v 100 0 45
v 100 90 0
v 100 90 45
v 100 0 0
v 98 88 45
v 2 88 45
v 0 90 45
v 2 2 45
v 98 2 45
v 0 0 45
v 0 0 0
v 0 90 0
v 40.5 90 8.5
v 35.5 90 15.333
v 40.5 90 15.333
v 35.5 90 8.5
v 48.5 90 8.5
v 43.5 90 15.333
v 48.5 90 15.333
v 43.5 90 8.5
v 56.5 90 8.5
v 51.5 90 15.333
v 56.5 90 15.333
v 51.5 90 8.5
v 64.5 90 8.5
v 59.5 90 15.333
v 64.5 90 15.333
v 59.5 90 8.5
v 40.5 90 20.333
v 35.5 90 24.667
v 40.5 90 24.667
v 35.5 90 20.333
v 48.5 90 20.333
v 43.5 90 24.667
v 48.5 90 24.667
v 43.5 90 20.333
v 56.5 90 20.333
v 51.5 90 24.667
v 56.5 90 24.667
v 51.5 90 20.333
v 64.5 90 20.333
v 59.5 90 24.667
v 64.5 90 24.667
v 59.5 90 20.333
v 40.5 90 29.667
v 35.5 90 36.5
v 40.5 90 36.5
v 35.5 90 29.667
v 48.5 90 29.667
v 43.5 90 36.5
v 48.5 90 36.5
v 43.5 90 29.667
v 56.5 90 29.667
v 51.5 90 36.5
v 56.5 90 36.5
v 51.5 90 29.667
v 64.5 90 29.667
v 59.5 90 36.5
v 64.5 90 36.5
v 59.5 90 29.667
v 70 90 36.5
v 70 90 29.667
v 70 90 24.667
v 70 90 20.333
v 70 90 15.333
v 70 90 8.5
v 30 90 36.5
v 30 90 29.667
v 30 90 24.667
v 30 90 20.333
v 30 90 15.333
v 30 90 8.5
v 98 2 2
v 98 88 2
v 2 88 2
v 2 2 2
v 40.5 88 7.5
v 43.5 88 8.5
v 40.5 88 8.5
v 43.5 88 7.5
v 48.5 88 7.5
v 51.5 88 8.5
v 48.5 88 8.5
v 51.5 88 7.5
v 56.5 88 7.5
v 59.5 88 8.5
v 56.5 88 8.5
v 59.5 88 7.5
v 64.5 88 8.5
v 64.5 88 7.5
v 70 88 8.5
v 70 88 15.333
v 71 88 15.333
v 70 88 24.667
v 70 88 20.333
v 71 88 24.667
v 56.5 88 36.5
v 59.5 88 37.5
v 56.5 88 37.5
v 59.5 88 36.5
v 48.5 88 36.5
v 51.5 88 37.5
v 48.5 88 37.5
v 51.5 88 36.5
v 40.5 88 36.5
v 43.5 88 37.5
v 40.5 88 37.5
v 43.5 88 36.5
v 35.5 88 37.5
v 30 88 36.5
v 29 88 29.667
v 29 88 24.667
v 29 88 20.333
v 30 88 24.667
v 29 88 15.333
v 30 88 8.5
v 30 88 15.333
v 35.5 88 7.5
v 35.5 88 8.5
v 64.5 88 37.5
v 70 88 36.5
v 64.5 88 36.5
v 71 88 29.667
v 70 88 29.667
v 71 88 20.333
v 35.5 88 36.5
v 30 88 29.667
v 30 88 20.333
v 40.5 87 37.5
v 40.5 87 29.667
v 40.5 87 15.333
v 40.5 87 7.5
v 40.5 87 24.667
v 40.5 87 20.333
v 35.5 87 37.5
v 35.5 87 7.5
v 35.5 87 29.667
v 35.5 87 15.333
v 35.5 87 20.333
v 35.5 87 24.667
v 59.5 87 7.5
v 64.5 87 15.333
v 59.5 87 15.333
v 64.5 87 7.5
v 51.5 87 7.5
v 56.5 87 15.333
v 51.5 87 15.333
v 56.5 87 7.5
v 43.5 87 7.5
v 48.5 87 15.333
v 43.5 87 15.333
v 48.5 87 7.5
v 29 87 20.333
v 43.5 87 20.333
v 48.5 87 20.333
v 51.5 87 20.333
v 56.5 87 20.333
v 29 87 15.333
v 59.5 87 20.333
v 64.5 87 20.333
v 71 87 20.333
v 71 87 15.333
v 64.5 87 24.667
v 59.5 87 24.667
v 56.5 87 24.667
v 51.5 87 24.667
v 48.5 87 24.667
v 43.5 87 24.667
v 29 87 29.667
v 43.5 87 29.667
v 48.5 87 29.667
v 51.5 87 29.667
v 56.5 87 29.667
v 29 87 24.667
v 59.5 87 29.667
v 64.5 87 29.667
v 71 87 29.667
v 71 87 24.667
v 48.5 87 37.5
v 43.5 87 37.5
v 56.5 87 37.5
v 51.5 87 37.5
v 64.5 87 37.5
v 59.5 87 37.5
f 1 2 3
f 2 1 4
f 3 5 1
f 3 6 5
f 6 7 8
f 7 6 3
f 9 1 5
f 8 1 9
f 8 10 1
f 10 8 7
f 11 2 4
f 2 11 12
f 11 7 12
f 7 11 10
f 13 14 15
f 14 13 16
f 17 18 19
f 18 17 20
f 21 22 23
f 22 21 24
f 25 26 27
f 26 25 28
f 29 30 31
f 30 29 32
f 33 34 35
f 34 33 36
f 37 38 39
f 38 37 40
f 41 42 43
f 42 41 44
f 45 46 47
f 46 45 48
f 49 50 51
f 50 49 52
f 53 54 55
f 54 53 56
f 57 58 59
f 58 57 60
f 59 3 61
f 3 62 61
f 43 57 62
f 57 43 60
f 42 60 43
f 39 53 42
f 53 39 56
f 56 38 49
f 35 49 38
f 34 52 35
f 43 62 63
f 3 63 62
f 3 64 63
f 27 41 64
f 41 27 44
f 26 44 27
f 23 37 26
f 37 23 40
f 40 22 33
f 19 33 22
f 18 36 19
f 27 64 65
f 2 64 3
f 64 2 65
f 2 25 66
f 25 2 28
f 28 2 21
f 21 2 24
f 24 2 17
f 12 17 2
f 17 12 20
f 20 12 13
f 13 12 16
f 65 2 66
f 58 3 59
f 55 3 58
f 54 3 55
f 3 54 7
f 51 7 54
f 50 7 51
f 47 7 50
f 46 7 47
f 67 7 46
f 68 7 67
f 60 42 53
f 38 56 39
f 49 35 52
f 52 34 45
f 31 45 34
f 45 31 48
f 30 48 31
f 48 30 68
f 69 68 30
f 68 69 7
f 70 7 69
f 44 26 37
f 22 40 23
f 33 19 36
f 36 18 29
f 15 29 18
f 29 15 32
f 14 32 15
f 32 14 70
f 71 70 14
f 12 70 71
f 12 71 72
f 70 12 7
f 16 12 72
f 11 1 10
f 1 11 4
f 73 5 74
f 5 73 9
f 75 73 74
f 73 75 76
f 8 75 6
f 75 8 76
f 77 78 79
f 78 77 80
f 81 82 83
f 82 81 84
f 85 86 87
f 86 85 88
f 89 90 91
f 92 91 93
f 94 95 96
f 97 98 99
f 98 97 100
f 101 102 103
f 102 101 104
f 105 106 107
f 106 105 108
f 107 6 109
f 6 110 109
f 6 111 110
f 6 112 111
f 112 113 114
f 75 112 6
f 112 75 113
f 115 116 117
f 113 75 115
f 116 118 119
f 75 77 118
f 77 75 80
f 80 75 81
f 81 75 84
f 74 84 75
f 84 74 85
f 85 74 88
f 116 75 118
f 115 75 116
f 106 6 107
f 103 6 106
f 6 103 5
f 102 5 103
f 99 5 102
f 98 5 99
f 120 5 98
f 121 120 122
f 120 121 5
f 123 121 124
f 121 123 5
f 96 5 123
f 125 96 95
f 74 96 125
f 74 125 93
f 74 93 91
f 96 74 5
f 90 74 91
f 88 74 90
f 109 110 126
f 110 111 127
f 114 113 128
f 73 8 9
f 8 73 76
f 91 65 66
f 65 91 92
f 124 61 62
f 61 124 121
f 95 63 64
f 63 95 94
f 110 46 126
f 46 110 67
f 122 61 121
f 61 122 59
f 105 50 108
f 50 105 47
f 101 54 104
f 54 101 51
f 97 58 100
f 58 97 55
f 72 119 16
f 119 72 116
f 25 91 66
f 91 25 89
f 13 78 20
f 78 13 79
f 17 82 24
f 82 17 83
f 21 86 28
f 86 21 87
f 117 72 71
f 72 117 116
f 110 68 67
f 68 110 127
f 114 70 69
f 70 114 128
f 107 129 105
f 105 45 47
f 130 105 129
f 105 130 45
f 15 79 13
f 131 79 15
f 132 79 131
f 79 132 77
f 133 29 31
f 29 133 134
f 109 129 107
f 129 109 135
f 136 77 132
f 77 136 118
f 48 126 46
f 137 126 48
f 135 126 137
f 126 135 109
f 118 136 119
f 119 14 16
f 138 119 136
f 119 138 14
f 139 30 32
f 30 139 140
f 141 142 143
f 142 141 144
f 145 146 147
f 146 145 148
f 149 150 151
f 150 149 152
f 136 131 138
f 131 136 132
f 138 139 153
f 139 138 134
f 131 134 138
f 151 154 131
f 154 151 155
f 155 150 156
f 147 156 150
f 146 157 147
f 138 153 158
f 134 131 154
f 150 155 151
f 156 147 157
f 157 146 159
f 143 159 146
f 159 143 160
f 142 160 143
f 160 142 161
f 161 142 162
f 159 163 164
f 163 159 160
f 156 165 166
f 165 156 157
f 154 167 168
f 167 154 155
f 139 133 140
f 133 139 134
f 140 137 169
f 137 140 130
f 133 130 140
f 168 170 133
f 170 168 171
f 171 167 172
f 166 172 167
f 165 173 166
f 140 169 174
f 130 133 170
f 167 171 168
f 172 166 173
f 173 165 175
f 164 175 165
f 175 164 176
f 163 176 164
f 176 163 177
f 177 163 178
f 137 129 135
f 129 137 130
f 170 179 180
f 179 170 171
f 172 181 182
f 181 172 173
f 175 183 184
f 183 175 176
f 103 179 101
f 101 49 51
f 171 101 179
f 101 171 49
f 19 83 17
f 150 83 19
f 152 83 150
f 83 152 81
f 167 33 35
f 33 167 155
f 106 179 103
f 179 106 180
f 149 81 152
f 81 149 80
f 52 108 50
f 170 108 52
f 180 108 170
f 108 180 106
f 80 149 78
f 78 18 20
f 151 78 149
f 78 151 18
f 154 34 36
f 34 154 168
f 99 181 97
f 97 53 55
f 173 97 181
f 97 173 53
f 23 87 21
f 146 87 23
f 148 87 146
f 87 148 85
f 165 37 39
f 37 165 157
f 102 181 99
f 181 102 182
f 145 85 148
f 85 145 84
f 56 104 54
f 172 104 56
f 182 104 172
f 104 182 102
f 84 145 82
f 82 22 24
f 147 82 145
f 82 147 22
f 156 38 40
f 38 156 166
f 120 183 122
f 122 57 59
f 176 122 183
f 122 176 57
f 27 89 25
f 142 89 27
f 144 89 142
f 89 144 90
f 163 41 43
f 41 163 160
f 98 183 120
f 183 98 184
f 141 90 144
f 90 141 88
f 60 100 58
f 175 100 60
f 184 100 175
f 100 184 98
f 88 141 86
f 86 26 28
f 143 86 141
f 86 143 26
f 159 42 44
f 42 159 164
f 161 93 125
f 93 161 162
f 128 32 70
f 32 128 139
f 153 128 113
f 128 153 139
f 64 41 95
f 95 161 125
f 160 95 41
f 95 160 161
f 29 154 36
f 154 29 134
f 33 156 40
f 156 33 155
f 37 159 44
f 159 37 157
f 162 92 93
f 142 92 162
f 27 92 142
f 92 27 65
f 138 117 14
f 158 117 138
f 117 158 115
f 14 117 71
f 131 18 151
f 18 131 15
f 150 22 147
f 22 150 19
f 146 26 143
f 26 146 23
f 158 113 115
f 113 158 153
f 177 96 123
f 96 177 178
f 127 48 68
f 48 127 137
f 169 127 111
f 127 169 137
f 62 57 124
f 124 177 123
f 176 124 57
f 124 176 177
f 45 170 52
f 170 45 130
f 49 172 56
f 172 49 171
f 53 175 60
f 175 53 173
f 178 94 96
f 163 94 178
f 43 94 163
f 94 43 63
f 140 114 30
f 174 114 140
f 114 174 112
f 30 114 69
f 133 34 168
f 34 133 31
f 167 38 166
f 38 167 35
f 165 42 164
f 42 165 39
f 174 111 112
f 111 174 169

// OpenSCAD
$fn = 32;

// ----------------------------------------------------------------------
// Vent box: crossgrid enclosure
// ----------------------------------------------------------------------

// --- parameters (mm) ---
box_l = 100;              // box length, X
box_w = 90;               // box width, Y
box_h = 45;               // box height, Z
wall_t = 2;               // shell wall thickness
win_l = 40;               // vent window width, X
win_h = 28;               // vent window height, Z
bar_w = 5;                // grid bar width
n_v = 4;                  // vertical bar count
n_h = 2;                  // horizontal bar count

win_z0 = (box_h - win_h) / 2;  // window lower edge Z
v_step = win_l / (n_v + 1);  // vertical bar step
h_step = win_h / (n_h + 1);  // horizontal bar step

difference() {
  union() {
    difference() {
      cube([box_l, box_w, box_h]);
  translate([wall_t, wall_t, wall_t])
    cube([box_l - 2 * wall_t, box_w - 2 * wall_t, box_h]);
  translate([(box_l - win_l) / 2, box_w - wall_t - 1, win_z0])
    cube([win_l, wall_t + 2, win_h]);
    }
    for (i = [1 : n_v])
      translate([(box_l - win_l) / 2 + i * v_step - bar_w / 2,
                 box_w - wall_t - 1, win_z0 - 1])
        cube([bar_w, wall_t + 1, win_h + 2]);
    for (i = [1 : n_h])
      translate([(box_l - win_l) / 2 - 1, box_w - wall_t - 1,
                 win_z0 + i * h_step - bar_w / 2])
        cube([win_l + 2, wall_t + 1, bar_w]);
  }
}
